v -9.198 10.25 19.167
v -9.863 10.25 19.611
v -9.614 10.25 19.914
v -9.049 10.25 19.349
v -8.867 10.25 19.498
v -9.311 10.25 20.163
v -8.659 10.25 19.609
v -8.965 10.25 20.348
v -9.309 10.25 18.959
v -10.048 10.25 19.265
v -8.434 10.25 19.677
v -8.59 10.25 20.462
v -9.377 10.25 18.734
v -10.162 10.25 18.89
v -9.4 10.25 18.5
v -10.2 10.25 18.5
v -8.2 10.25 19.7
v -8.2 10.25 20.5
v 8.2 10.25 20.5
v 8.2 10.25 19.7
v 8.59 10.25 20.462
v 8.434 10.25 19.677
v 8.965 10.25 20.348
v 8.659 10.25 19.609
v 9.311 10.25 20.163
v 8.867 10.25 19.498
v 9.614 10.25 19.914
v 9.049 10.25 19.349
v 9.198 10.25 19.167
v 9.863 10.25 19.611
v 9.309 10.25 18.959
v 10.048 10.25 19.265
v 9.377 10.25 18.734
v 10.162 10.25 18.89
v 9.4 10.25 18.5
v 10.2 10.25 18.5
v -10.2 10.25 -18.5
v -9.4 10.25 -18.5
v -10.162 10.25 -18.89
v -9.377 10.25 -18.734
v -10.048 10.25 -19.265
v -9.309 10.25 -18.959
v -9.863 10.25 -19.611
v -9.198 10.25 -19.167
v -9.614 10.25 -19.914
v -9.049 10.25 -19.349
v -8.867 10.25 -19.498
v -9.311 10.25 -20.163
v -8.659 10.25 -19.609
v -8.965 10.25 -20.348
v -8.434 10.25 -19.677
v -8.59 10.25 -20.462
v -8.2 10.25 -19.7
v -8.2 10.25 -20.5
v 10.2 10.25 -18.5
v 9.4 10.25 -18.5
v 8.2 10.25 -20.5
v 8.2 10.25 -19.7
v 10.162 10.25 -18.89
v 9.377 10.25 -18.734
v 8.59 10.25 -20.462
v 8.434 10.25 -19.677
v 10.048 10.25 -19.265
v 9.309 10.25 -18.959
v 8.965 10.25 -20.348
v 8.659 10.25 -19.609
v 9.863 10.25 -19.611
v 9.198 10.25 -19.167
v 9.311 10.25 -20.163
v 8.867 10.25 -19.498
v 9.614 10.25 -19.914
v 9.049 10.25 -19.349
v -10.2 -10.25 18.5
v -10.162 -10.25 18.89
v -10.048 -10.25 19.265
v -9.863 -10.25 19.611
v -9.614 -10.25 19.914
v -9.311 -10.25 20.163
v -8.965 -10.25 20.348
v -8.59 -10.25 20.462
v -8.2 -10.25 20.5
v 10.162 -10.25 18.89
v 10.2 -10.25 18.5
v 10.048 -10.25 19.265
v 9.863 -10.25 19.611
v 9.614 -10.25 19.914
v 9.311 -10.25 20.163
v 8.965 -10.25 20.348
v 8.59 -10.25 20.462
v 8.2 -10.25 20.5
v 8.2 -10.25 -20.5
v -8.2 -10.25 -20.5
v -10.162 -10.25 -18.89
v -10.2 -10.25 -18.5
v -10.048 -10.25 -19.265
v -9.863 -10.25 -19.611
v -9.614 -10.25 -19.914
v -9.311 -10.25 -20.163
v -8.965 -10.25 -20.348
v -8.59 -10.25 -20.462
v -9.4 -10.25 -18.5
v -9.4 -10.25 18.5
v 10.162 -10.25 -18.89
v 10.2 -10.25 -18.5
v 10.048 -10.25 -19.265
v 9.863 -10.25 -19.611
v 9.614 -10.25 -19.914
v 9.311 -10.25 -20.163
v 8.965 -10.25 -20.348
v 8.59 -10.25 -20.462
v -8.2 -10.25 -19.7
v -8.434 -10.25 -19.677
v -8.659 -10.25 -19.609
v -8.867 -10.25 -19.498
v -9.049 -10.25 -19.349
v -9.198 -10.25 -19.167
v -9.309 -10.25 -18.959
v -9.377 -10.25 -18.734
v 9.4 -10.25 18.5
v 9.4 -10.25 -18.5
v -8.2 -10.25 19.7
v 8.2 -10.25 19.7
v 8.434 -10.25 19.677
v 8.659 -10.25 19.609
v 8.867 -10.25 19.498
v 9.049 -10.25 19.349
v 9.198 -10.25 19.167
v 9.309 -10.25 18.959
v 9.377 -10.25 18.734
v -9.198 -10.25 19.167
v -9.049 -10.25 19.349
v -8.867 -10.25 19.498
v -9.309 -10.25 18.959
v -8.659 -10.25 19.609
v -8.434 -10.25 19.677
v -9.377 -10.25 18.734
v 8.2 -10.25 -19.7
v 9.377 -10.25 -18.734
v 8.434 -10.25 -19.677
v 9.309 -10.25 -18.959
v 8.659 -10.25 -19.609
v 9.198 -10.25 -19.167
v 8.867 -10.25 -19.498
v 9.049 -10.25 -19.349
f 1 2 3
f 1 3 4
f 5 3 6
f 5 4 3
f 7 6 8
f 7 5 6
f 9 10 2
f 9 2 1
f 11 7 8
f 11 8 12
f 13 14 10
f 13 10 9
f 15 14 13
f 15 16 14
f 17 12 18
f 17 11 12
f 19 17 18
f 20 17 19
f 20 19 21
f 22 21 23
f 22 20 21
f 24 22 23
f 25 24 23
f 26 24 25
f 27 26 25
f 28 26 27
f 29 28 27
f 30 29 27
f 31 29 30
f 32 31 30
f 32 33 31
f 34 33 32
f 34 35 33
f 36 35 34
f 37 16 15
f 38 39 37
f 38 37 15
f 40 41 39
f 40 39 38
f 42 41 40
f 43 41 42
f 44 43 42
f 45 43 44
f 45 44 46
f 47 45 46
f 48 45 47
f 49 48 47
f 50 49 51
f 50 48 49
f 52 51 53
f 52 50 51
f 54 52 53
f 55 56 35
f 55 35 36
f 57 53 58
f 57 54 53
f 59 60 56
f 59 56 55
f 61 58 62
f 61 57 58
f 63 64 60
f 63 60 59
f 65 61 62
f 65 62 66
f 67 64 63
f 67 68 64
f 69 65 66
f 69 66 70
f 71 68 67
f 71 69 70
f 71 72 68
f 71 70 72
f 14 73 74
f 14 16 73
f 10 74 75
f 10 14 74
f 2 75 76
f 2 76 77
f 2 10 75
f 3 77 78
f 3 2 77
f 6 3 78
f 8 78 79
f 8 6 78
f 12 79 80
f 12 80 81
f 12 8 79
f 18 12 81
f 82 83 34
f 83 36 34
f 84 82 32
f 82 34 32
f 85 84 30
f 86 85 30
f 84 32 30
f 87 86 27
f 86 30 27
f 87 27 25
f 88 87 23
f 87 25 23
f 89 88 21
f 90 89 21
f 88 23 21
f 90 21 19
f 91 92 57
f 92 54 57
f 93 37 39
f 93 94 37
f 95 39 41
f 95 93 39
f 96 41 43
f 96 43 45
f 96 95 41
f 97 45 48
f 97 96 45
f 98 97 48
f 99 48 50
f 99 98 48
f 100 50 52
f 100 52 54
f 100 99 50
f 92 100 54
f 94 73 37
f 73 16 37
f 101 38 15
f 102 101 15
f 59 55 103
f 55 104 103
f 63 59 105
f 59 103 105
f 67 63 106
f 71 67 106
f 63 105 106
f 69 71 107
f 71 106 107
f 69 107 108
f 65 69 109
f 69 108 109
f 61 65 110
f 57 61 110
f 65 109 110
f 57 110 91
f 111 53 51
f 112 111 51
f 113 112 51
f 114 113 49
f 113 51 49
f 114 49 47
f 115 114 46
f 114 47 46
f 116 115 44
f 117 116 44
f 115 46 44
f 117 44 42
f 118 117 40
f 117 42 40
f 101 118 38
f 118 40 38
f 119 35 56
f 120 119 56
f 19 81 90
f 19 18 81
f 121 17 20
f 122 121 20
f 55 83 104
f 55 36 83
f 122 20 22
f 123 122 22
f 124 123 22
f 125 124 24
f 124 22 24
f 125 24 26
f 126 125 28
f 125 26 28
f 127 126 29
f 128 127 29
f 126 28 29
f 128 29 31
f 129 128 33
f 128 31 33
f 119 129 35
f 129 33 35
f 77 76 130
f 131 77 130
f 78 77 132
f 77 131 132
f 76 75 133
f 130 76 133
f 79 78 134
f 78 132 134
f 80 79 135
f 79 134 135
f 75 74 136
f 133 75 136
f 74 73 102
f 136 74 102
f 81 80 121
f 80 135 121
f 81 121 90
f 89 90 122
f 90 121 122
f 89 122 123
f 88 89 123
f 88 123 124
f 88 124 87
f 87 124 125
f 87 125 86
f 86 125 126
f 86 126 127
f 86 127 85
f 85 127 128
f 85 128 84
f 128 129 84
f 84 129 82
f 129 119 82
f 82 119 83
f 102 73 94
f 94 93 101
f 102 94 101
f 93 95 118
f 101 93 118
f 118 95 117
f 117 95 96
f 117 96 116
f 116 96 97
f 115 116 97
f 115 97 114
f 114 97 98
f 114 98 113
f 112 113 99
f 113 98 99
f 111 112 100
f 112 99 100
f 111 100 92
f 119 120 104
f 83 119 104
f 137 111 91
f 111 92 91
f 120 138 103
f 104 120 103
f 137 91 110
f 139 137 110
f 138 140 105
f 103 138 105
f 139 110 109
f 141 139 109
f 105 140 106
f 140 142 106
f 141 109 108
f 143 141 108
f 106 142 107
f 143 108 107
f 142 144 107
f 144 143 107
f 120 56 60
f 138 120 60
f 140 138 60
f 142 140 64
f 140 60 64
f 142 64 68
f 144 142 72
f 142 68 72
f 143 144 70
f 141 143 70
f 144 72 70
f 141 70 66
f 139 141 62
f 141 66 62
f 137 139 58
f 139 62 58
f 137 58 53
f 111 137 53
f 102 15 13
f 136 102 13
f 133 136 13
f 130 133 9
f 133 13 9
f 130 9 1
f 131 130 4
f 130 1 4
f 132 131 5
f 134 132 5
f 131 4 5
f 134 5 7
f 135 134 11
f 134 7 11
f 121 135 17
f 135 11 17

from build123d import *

# Parameters (mm, degrees)
BASES_W            = 20.4
BASES_H            = 41
BASE_DEPTH         = 10.25
BASE_F_R           = 2
CUT_EXTRUDE3_DEPTH = 21.5


with BuildPart() as part:
    # BaseS → BASE (new body, symmetric)
    with BuildSketch(Plane(origin=(0, 0, 0), x_dir=(1, 0, 0), z_dir=(0, 1, 0))):
        Rectangle(BASES_W, BASES_H)
    extrude(amount=BASE_DEPTH, both=True)

    # BASE F
    base_f_edges = [part.edges().sort_by_distance(p)[0] for p in [
        (10.2, 0, 20.5),
        (-10.2, 0, 20.5),
        (-10.2, 0, -20.5),
        (10.2, 0, -20.5),
    ]]
    fillet(base_f_edges, radius=BASE_F_R)

    # PocketS → Cut-Extrude3 (cut, through all)
    with BuildSketch(Plane(origin=(0, 10.25, 0), x_dir=(1, 0, 0), z_dir=(0, 1, 0))):
        with BuildLine():
            Line((8.2, 19.7), (-8.2, 19.7))
            ThreePointArc((-8.2, 19.7), (-9.048528137, 19.348528137), (-9.4, 18.5))
            Line((-9.4, 18.5), (-9.4, -18.5))
            ThreePointArc((-9.4, -18.5), (-9.048528137, -19.348528137), (-8.2, -19.7))
            Line((-8.2, -19.7), (8.2, -19.7))
            ThreePointArc((8.2, -19.7), (9.048528137, -19.348528137), (9.4, -18.5))
            Line((9.4, -18.5), (9.4, 18.5))
            ThreePointArc((9.4, 18.5), (9.048528137, 19.348528137), (8.2, 19.7))
        make_face()
    extrude(amount=-CUT_EXTRUDE3_DEPTH, mode=Mode.SUBTRACT)


solid = part.part
